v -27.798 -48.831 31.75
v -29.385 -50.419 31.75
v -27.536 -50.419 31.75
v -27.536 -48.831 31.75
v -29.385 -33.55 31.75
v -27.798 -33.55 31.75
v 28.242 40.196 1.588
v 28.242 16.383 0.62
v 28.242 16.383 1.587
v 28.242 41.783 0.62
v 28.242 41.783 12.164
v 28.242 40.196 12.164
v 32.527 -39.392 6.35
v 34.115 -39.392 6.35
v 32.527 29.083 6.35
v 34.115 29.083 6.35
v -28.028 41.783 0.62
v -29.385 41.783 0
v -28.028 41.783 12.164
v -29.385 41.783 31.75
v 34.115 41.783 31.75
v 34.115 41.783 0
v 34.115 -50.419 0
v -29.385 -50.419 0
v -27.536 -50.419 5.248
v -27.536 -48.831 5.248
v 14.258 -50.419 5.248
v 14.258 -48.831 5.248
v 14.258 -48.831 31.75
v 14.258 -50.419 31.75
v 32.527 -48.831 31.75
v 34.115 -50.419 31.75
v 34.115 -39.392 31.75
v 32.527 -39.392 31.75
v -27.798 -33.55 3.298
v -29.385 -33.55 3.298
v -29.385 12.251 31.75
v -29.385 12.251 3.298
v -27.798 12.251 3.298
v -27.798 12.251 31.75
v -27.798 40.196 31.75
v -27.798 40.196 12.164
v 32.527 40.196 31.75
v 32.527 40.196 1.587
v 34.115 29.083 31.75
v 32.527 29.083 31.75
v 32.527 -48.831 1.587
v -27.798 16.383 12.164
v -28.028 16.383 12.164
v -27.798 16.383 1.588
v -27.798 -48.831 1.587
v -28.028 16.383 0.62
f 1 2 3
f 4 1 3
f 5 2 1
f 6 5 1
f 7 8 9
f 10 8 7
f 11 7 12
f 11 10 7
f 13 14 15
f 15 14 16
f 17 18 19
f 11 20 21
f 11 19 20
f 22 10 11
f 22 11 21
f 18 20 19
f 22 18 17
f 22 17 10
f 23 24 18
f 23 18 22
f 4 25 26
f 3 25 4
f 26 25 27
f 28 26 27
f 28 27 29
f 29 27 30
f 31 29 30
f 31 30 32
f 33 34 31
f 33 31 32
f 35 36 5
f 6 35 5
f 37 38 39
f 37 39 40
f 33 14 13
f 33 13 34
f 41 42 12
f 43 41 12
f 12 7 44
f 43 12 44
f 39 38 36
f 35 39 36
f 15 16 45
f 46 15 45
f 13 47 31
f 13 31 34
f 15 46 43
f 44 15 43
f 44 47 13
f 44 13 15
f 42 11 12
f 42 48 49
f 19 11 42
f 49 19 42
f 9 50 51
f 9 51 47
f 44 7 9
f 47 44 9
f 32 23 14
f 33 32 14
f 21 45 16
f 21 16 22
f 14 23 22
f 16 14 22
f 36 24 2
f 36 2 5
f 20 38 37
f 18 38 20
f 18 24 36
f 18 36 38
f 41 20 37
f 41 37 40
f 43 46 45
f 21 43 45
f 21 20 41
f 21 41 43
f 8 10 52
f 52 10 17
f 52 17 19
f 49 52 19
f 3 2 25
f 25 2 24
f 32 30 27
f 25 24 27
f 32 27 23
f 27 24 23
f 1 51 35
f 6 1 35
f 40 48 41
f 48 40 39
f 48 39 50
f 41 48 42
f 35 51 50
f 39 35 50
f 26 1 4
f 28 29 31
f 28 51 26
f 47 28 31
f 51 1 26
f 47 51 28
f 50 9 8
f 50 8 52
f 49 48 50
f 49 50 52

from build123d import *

# Parameters (mm, degrees)
F0_W      = 63.5
F0_H      = 92.202
F1_DEPTH  = 31.75
F2_T      = -1.5875
F3_W      = 68.475886
F3_H      = 25.4
F4_DEPTH  = 25.4
F5_W      = 41.793442
F5_H      = 26.501633
F6_DEPTH  = 25.4
F7_W      = 45.800777
F7_H      = 28.45159
F8_DEPTH  = 25.4
F9_W      = 56.269303
F9_H      = 11.544435
F10_DEPTH = 25.4


with BuildPart() as f1:
    # F0 (on Top) → F1 (new body)
    with BuildSketch(Plane.XY):
        with Locations((2.364983, -4.317552)):
            Rectangle(F0_W, F0_H)
    extrude(amount=F1_DEPTH)

    # F2
    f2_openings = [f1.faces().sort_by_distance(p)[0] for p in [
        (2.364983, -4.317552, 31.75),
    ]]
    offset(amount=F2_T, openings=f2_openings)

    # F3 (on face) → F4 (cut)
    with BuildSketch(Plane.YZ.offset(34.114983)):
        with Locations((-5.154495, 19.05)):
            Rectangle(F3_W, F3_H)
    extrude(amount=-F4_DEPTH, mode=Mode.SUBTRACT)

    # F5 (on face) → F6 (cut)
    with BuildSketch(Plane.XZ.offset(50.418552)):
        with Locations((-6.639066, 18.499184)):
            Rectangle(F5_W, F5_H)
    extrude(amount=-F6_DEPTH, mode=Mode.SUBTRACT)

    # F7 (on face) → F8 (cut)
    with BuildSketch(Plane(origin=(-29.385017, 0, 0), x_dir=(0, -1, 0), z_dir=(-1, 0, 0))):
        with Locations((10.649152, 17.524205)):
            Rectangle(F7_W, F7_H)
    extrude(amount=-F8_DEPTH, mode=Mode.SUBTRACT)

    # F9 (on face) → F10 (cut)
    with BuildSketch(Plane(origin=(0, 41.783448, 0), x_dir=(-1, 0, 0), z_dir=(0, 1, 0))):
        with Locations((-0.107144, 6.392072)):
            Rectangle(F9_W, F9_H)
    extrude(amount=-F10_DEPTH, mode=Mode.SUBTRACT)


solid = f1.part
